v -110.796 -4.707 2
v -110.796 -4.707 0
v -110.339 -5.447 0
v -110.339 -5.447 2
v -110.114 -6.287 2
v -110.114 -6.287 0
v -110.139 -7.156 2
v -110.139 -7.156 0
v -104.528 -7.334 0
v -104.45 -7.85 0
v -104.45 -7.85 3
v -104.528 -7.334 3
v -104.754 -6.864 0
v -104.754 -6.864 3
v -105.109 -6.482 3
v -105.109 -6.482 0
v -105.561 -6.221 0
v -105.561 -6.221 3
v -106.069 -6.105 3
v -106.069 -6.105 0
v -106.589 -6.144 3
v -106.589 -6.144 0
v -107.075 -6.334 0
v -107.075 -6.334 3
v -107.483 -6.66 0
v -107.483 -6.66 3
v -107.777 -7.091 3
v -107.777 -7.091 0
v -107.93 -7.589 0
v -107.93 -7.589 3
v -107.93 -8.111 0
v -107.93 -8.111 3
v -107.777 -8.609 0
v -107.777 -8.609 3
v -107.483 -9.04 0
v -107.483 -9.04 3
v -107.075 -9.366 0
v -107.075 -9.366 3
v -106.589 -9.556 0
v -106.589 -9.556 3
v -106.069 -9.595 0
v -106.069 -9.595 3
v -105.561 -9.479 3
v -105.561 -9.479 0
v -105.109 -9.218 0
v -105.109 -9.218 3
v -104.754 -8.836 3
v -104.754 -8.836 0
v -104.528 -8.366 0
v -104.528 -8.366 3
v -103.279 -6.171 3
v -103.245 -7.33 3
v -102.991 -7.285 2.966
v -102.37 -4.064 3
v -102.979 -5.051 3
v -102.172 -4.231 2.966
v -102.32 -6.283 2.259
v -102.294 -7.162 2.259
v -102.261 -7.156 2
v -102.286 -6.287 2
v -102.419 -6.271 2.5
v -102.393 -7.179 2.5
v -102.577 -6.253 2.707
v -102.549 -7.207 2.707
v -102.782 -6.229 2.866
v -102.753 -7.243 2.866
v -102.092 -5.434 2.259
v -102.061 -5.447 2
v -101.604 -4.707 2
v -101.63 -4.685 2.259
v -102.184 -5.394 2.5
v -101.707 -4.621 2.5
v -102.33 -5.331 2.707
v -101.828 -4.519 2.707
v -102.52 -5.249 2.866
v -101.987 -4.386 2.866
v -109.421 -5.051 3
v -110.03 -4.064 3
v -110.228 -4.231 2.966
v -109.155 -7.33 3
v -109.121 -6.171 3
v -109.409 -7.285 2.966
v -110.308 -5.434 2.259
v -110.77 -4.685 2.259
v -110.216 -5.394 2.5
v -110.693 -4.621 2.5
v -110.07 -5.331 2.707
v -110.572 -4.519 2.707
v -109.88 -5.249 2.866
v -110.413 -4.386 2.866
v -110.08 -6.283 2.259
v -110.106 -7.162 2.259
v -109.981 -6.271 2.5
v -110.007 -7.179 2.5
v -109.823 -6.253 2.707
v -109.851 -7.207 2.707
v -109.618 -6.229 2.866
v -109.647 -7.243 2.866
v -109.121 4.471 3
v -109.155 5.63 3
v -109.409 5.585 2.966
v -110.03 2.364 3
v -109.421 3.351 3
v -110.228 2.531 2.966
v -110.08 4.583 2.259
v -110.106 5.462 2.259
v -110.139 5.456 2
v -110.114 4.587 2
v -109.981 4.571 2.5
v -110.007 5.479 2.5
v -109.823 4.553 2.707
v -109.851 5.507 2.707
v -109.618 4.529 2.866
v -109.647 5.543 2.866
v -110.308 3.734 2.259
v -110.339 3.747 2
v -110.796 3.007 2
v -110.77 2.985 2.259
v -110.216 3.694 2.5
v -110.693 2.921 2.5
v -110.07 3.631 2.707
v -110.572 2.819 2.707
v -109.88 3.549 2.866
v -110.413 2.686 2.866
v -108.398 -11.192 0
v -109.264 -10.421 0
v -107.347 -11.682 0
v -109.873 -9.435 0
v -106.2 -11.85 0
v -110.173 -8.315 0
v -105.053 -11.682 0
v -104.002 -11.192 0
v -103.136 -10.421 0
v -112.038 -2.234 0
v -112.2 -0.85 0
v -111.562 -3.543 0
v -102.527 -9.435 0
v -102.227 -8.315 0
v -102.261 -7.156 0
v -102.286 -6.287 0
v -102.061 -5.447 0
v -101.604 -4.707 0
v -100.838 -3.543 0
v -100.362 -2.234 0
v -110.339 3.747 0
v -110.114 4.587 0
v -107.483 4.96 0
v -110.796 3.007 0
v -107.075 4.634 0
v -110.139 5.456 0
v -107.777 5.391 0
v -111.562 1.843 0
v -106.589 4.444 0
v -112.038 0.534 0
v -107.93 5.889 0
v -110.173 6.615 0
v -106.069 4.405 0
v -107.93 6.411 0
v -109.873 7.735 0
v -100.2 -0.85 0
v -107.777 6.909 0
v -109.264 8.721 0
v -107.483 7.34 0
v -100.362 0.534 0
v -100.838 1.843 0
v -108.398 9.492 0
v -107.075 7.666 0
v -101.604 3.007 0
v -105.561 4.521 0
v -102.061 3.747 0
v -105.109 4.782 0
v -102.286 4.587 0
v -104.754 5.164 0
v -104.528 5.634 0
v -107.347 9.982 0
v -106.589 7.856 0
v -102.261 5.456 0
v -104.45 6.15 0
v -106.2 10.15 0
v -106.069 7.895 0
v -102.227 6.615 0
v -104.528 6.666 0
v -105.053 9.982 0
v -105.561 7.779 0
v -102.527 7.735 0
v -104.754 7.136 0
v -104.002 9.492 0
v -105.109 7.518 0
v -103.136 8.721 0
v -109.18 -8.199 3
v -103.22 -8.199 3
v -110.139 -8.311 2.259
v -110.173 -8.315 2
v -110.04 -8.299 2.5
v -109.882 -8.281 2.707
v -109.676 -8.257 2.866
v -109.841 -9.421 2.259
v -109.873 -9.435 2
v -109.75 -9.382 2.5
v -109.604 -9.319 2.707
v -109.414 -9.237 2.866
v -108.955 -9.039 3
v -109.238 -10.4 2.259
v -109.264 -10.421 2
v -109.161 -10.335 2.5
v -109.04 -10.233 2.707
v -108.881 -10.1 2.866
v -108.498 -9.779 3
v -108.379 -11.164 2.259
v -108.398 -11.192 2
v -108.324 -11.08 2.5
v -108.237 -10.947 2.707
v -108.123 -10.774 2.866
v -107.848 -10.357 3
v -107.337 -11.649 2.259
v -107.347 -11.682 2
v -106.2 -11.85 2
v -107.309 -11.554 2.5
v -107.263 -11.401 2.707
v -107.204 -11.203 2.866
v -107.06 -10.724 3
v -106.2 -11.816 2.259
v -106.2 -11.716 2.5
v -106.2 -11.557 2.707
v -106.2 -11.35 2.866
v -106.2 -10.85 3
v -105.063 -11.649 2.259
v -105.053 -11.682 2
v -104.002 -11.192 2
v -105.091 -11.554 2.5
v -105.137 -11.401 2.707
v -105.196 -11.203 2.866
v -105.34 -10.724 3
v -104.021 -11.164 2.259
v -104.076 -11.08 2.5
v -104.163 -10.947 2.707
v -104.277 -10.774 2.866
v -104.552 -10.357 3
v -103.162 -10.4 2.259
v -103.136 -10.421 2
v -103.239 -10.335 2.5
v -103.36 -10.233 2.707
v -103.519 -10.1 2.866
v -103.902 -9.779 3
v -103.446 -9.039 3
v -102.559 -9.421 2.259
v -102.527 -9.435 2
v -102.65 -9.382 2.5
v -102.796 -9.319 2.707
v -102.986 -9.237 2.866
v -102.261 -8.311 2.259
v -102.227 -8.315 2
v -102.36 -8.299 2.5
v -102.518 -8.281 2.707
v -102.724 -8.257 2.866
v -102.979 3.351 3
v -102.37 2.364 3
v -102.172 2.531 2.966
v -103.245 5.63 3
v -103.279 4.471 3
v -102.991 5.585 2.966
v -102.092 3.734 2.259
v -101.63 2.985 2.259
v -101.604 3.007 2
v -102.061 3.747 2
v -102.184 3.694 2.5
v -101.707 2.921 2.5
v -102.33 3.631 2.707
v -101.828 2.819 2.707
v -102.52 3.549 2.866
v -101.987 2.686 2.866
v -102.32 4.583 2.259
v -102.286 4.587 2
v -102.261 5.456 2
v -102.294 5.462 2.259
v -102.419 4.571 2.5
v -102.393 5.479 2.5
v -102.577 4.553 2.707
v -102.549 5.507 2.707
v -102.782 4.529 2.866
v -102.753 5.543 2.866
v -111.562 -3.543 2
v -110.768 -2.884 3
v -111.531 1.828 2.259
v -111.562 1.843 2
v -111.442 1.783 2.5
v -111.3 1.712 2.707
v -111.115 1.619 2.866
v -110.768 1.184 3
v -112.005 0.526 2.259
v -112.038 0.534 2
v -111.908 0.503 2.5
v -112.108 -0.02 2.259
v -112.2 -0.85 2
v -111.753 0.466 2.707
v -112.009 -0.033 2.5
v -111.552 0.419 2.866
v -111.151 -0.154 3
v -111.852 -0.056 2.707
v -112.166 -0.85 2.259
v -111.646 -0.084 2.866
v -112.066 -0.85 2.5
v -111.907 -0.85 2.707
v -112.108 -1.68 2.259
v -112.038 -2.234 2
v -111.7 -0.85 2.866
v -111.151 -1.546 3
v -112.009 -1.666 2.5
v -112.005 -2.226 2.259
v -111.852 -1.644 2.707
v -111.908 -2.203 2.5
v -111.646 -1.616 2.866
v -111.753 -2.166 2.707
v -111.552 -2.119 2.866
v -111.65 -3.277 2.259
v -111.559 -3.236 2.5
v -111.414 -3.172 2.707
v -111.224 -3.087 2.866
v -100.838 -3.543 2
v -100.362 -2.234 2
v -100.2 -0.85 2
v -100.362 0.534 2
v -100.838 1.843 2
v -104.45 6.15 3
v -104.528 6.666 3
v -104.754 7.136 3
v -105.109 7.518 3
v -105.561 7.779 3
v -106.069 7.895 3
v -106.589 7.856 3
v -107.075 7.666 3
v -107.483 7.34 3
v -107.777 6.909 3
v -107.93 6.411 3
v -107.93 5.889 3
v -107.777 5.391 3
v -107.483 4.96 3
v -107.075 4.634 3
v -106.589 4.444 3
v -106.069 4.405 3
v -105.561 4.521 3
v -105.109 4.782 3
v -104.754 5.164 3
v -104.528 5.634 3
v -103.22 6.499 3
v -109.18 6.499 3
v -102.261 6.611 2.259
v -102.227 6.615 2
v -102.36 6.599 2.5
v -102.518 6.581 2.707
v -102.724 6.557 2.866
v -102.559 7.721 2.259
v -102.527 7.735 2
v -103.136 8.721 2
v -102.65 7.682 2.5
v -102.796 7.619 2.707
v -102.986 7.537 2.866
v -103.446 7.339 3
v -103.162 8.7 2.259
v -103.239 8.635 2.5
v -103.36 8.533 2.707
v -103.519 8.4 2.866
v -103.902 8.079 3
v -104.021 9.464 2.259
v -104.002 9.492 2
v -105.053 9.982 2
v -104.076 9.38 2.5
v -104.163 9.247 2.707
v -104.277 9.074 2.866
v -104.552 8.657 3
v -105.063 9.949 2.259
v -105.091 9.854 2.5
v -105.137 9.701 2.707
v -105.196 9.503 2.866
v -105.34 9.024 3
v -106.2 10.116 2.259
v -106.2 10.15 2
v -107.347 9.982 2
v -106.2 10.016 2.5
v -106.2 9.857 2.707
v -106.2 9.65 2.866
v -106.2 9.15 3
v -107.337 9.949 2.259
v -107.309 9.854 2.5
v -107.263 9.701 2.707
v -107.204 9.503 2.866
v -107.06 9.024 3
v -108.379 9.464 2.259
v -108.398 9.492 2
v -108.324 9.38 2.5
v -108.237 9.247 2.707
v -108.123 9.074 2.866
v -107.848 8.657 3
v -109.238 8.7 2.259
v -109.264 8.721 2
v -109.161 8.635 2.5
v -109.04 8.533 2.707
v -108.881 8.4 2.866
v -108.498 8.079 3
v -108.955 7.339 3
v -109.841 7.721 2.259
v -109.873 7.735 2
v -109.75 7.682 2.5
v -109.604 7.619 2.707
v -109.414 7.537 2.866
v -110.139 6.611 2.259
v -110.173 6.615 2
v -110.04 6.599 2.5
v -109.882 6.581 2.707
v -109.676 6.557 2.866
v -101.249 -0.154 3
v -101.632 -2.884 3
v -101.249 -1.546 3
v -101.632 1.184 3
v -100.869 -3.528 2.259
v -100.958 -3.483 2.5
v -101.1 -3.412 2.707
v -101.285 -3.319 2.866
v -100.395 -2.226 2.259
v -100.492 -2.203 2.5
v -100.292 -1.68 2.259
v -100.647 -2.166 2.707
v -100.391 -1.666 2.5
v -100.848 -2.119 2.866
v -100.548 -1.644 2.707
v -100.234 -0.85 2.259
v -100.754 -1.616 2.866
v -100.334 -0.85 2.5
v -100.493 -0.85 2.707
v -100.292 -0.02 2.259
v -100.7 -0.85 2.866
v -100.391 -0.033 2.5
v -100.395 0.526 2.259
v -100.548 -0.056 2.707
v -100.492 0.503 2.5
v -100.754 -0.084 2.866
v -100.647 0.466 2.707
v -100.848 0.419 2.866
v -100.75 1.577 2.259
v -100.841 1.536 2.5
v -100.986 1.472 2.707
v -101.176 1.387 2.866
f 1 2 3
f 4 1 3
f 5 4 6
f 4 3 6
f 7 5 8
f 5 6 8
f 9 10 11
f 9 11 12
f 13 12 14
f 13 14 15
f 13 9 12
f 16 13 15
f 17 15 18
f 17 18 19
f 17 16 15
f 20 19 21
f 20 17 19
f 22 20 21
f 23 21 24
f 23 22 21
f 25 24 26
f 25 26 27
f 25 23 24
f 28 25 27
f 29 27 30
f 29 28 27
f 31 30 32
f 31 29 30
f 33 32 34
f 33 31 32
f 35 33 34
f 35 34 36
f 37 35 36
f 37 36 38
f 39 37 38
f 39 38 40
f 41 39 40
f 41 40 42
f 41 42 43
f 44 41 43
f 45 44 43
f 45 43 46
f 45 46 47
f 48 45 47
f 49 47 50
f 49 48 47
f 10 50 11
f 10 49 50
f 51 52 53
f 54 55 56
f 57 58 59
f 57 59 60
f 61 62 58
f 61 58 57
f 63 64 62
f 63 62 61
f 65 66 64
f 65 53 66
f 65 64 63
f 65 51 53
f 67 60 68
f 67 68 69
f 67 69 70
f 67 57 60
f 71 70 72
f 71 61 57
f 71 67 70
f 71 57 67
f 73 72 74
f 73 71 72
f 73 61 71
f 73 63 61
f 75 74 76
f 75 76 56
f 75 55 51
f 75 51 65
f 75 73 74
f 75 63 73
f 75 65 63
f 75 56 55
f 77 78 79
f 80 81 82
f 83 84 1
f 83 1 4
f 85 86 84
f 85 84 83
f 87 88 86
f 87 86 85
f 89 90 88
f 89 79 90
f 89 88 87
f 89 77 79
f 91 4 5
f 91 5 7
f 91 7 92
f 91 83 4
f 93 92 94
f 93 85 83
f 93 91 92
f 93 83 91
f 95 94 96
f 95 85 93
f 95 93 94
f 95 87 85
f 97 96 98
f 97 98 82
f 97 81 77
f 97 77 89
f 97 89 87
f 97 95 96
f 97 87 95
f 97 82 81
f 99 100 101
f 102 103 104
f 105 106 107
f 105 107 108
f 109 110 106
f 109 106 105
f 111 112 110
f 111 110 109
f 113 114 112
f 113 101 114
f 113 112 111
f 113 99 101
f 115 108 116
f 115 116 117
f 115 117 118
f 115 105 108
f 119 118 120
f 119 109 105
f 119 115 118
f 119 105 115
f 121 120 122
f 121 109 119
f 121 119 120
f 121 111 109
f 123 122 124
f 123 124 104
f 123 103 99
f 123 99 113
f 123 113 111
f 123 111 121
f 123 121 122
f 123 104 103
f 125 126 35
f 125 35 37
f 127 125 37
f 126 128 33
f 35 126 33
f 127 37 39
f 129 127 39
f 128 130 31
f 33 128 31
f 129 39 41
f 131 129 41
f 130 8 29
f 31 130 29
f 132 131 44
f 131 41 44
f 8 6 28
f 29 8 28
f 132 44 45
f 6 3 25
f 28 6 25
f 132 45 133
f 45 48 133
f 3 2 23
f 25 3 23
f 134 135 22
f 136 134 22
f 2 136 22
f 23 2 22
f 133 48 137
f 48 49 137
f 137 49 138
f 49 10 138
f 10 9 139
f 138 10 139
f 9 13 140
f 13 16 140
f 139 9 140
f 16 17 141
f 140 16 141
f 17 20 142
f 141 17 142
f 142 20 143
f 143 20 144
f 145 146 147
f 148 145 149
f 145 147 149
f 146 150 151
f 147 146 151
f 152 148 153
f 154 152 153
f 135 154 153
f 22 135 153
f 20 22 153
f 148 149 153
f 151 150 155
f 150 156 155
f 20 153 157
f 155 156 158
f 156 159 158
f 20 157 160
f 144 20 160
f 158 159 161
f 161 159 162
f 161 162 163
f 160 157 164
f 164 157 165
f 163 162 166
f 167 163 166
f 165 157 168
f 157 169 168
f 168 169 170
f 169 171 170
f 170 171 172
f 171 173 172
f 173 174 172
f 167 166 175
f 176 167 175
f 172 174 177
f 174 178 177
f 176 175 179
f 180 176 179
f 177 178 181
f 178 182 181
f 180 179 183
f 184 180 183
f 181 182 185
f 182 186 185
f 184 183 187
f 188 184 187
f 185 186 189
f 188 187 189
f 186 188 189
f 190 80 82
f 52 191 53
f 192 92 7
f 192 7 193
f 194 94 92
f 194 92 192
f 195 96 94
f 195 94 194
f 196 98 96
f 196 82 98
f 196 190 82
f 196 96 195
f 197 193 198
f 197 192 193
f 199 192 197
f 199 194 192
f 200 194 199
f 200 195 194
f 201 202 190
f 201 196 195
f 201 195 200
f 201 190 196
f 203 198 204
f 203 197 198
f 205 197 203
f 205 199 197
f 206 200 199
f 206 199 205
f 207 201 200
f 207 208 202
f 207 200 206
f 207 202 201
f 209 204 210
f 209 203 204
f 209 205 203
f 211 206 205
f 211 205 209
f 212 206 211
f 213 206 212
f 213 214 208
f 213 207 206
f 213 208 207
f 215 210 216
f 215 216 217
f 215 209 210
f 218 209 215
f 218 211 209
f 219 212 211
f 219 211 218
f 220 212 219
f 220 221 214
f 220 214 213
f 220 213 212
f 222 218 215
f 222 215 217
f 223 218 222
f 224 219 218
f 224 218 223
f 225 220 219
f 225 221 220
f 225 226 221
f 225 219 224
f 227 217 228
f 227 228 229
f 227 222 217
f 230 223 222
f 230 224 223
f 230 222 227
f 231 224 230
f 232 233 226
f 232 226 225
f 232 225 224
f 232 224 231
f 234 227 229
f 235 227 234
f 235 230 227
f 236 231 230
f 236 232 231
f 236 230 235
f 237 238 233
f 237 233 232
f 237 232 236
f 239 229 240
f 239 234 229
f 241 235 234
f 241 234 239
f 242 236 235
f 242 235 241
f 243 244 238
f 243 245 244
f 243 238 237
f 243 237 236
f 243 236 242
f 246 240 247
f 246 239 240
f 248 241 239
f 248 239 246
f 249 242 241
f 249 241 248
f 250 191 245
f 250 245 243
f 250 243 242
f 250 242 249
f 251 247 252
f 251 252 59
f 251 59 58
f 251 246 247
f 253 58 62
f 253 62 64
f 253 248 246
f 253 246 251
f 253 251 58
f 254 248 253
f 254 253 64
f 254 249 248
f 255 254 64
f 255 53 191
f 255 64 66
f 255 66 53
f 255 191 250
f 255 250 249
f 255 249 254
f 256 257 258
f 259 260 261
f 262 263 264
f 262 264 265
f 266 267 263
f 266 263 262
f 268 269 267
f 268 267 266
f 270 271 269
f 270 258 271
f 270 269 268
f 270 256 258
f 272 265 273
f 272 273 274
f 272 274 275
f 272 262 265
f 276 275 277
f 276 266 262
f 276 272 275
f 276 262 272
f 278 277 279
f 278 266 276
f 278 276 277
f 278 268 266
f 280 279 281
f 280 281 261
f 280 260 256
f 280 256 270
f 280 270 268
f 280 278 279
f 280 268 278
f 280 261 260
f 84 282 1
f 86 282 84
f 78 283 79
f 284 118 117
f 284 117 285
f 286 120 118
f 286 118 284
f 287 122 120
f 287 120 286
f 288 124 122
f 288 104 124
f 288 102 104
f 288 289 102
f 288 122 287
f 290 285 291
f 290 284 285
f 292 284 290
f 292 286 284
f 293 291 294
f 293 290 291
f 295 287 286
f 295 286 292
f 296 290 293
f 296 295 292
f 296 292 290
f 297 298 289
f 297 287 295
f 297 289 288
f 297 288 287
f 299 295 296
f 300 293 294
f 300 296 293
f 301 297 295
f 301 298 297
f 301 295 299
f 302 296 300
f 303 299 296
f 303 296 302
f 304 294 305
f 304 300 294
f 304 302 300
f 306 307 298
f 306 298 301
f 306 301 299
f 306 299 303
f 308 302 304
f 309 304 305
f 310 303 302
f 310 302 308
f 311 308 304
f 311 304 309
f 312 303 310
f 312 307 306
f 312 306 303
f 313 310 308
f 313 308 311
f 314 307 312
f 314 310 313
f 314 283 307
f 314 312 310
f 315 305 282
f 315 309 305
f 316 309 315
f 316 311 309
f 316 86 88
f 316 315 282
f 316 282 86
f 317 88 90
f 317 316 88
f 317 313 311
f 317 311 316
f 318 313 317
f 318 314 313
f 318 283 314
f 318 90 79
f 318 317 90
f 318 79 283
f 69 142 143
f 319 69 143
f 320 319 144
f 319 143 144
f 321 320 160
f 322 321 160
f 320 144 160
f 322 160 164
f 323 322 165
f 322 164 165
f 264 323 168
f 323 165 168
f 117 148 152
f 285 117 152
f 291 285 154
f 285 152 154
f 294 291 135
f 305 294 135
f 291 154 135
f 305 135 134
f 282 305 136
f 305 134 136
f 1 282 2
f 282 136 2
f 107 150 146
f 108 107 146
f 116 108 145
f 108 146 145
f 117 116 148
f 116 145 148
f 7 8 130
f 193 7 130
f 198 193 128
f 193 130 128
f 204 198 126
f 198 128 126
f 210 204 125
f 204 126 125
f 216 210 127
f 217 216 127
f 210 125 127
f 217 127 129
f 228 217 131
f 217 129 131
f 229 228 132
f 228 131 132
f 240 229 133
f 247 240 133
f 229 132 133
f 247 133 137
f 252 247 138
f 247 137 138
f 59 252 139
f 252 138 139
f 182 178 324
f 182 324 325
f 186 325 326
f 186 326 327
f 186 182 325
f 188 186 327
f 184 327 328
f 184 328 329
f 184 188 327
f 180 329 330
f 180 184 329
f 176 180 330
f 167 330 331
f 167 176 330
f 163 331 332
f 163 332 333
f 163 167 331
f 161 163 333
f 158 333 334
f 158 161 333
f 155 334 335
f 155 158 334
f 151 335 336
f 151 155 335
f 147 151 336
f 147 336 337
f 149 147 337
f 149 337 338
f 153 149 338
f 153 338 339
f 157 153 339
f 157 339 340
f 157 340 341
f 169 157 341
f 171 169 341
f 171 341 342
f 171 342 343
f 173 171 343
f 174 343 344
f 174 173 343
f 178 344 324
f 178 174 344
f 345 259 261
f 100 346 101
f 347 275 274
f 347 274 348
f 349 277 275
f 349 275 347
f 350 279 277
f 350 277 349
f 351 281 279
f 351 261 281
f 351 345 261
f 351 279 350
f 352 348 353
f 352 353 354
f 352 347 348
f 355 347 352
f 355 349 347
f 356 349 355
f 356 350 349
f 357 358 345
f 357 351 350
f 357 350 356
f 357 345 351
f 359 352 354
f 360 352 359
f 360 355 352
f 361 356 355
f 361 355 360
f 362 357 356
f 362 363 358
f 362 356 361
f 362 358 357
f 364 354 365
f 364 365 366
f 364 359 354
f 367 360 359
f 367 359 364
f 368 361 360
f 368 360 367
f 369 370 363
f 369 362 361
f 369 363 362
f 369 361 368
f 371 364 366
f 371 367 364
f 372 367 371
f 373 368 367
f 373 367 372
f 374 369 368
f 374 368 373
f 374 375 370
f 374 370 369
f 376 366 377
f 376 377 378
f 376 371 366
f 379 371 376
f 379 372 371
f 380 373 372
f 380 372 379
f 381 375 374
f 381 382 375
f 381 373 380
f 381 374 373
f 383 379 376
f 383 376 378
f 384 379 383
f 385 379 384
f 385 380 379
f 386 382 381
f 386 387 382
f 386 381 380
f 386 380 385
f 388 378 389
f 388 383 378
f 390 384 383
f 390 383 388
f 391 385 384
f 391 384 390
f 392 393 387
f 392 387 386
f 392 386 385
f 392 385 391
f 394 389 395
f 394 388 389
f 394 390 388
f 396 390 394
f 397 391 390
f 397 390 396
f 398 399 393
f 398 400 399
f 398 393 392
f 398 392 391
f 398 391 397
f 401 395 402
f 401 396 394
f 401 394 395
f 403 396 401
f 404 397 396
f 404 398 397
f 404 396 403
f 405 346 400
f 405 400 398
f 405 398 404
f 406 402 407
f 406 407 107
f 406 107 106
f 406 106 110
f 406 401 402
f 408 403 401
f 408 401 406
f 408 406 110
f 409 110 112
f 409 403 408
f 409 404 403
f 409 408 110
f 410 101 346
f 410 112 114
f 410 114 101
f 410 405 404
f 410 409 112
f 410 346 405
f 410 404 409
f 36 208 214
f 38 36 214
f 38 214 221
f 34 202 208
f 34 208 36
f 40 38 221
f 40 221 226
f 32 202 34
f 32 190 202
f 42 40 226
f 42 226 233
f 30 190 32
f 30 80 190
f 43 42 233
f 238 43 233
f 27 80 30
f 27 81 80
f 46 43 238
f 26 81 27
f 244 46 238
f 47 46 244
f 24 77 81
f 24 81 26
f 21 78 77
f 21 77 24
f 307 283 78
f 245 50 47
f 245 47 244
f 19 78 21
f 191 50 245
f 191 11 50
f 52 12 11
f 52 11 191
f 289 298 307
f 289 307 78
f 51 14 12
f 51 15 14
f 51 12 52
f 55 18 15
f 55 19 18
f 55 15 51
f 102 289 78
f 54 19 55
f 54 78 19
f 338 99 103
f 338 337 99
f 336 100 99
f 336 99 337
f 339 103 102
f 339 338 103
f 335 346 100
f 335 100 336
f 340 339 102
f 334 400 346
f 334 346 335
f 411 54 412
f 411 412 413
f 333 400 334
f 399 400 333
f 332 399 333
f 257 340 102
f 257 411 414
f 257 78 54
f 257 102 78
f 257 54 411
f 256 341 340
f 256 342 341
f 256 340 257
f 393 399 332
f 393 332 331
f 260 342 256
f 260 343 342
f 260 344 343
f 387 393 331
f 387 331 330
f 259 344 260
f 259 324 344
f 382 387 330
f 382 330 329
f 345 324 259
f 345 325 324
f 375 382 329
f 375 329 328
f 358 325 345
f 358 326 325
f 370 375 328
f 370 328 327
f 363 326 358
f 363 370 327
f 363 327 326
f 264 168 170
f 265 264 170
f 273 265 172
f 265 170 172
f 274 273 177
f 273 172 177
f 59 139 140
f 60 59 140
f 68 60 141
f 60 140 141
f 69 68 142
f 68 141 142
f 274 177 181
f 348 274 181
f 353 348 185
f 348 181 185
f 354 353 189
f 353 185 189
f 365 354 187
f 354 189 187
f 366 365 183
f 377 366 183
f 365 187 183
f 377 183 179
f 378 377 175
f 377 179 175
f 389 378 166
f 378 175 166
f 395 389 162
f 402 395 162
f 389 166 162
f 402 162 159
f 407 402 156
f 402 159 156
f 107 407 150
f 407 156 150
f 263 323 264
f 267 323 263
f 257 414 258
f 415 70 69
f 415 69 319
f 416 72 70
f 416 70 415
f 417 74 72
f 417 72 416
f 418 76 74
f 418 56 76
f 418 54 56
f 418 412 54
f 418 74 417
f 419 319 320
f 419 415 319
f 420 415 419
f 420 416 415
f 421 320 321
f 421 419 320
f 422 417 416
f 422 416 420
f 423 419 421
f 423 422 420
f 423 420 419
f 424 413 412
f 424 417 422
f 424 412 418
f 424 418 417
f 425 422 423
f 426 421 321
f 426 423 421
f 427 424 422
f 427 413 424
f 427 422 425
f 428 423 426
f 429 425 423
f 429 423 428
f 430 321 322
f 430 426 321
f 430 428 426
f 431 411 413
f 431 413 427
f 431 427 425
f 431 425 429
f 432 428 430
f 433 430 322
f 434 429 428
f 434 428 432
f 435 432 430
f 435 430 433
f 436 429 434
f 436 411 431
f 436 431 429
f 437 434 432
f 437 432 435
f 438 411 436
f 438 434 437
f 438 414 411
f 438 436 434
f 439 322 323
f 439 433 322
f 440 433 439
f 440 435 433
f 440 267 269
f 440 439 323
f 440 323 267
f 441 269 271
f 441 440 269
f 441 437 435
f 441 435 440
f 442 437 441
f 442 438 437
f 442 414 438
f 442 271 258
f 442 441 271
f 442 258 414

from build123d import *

# Parameters (mm, degrees)
SKETCH1_R           = 1.75
BOSS_EXTRUDE1_DEPTH = 3
FILLET1_R           = 1


with BuildPart() as part:
    # Sketch1 → Boss-Extrude1 (new body)
    with BuildSketch(Plane.XY):
        with BuildLine():
            ThreePointArc((-110.795927452, 3.007150415), (-112.200010897, -0.849992442), (-110.795927452, -4.707135299))
            ThreePointArc((-110.795927452, -4.707135299), (-110.196213999, -5.858855042), (-110.139367944, -7.156114891))
            ThreePointArc((-110.139367944, -7.156114891), (-106.200010897, -11.849992442), (-102.26065385, -7.156114891))
            ThreePointArc((-102.26065385, -7.156114891), (-102.203807795, -5.858855042), (-101.604094342, -4.707135299))
            ThreePointArc((-101.604094342, -4.707135299), (-100.200010897, -0.849992442), (-101.604094342, 3.007150415))
            ThreePointArc((-101.604094342, 3.007150415), (-102.203807795, 4.158870157), (-102.26065385, 5.456130007))
            ThreePointArc((-102.26065385, 5.456130007), (-106.200010897, 10.150007558), (-110.139367944, 5.456130007))
            ThreePointArc((-110.139367944, 5.456130007), (-110.196213999, 4.158870157), (-110.795927452, 3.007150415))
        make_face()
        with Locations((-106.200010897, 6.150007558)):
            Circle(SKETCH1_R, mode=Mode.SUBTRACT)
        with Locations((-106.200010897, -7.849992442)):
            Circle(SKETCH1_R, mode=Mode.SUBTRACT)
    extrude(amount=BOSS_EXTRUDE1_DEPTH)

    # Fillet1
    fillet1_edges = [part.edges().sort_by_distance(p)[0] for p in [
        (-102.203807795, -5.858855042, 3),
        (-100.200010897, -0.849992442, 3),
        (-102.203807795, 4.158870157, 3),
        (-106.200010897, 10.150007558, 3),
        (-110.196213999, 4.158870157, 3),
        (-112.200010897, -0.849992442, 3),
        (-110.196213999, -5.858855042, 3),
        (-106.200010897, -11.849992442, 3),
    ]]
    fillet(fillet1_edges, radius=FILLET1_R)


solid = part.part
